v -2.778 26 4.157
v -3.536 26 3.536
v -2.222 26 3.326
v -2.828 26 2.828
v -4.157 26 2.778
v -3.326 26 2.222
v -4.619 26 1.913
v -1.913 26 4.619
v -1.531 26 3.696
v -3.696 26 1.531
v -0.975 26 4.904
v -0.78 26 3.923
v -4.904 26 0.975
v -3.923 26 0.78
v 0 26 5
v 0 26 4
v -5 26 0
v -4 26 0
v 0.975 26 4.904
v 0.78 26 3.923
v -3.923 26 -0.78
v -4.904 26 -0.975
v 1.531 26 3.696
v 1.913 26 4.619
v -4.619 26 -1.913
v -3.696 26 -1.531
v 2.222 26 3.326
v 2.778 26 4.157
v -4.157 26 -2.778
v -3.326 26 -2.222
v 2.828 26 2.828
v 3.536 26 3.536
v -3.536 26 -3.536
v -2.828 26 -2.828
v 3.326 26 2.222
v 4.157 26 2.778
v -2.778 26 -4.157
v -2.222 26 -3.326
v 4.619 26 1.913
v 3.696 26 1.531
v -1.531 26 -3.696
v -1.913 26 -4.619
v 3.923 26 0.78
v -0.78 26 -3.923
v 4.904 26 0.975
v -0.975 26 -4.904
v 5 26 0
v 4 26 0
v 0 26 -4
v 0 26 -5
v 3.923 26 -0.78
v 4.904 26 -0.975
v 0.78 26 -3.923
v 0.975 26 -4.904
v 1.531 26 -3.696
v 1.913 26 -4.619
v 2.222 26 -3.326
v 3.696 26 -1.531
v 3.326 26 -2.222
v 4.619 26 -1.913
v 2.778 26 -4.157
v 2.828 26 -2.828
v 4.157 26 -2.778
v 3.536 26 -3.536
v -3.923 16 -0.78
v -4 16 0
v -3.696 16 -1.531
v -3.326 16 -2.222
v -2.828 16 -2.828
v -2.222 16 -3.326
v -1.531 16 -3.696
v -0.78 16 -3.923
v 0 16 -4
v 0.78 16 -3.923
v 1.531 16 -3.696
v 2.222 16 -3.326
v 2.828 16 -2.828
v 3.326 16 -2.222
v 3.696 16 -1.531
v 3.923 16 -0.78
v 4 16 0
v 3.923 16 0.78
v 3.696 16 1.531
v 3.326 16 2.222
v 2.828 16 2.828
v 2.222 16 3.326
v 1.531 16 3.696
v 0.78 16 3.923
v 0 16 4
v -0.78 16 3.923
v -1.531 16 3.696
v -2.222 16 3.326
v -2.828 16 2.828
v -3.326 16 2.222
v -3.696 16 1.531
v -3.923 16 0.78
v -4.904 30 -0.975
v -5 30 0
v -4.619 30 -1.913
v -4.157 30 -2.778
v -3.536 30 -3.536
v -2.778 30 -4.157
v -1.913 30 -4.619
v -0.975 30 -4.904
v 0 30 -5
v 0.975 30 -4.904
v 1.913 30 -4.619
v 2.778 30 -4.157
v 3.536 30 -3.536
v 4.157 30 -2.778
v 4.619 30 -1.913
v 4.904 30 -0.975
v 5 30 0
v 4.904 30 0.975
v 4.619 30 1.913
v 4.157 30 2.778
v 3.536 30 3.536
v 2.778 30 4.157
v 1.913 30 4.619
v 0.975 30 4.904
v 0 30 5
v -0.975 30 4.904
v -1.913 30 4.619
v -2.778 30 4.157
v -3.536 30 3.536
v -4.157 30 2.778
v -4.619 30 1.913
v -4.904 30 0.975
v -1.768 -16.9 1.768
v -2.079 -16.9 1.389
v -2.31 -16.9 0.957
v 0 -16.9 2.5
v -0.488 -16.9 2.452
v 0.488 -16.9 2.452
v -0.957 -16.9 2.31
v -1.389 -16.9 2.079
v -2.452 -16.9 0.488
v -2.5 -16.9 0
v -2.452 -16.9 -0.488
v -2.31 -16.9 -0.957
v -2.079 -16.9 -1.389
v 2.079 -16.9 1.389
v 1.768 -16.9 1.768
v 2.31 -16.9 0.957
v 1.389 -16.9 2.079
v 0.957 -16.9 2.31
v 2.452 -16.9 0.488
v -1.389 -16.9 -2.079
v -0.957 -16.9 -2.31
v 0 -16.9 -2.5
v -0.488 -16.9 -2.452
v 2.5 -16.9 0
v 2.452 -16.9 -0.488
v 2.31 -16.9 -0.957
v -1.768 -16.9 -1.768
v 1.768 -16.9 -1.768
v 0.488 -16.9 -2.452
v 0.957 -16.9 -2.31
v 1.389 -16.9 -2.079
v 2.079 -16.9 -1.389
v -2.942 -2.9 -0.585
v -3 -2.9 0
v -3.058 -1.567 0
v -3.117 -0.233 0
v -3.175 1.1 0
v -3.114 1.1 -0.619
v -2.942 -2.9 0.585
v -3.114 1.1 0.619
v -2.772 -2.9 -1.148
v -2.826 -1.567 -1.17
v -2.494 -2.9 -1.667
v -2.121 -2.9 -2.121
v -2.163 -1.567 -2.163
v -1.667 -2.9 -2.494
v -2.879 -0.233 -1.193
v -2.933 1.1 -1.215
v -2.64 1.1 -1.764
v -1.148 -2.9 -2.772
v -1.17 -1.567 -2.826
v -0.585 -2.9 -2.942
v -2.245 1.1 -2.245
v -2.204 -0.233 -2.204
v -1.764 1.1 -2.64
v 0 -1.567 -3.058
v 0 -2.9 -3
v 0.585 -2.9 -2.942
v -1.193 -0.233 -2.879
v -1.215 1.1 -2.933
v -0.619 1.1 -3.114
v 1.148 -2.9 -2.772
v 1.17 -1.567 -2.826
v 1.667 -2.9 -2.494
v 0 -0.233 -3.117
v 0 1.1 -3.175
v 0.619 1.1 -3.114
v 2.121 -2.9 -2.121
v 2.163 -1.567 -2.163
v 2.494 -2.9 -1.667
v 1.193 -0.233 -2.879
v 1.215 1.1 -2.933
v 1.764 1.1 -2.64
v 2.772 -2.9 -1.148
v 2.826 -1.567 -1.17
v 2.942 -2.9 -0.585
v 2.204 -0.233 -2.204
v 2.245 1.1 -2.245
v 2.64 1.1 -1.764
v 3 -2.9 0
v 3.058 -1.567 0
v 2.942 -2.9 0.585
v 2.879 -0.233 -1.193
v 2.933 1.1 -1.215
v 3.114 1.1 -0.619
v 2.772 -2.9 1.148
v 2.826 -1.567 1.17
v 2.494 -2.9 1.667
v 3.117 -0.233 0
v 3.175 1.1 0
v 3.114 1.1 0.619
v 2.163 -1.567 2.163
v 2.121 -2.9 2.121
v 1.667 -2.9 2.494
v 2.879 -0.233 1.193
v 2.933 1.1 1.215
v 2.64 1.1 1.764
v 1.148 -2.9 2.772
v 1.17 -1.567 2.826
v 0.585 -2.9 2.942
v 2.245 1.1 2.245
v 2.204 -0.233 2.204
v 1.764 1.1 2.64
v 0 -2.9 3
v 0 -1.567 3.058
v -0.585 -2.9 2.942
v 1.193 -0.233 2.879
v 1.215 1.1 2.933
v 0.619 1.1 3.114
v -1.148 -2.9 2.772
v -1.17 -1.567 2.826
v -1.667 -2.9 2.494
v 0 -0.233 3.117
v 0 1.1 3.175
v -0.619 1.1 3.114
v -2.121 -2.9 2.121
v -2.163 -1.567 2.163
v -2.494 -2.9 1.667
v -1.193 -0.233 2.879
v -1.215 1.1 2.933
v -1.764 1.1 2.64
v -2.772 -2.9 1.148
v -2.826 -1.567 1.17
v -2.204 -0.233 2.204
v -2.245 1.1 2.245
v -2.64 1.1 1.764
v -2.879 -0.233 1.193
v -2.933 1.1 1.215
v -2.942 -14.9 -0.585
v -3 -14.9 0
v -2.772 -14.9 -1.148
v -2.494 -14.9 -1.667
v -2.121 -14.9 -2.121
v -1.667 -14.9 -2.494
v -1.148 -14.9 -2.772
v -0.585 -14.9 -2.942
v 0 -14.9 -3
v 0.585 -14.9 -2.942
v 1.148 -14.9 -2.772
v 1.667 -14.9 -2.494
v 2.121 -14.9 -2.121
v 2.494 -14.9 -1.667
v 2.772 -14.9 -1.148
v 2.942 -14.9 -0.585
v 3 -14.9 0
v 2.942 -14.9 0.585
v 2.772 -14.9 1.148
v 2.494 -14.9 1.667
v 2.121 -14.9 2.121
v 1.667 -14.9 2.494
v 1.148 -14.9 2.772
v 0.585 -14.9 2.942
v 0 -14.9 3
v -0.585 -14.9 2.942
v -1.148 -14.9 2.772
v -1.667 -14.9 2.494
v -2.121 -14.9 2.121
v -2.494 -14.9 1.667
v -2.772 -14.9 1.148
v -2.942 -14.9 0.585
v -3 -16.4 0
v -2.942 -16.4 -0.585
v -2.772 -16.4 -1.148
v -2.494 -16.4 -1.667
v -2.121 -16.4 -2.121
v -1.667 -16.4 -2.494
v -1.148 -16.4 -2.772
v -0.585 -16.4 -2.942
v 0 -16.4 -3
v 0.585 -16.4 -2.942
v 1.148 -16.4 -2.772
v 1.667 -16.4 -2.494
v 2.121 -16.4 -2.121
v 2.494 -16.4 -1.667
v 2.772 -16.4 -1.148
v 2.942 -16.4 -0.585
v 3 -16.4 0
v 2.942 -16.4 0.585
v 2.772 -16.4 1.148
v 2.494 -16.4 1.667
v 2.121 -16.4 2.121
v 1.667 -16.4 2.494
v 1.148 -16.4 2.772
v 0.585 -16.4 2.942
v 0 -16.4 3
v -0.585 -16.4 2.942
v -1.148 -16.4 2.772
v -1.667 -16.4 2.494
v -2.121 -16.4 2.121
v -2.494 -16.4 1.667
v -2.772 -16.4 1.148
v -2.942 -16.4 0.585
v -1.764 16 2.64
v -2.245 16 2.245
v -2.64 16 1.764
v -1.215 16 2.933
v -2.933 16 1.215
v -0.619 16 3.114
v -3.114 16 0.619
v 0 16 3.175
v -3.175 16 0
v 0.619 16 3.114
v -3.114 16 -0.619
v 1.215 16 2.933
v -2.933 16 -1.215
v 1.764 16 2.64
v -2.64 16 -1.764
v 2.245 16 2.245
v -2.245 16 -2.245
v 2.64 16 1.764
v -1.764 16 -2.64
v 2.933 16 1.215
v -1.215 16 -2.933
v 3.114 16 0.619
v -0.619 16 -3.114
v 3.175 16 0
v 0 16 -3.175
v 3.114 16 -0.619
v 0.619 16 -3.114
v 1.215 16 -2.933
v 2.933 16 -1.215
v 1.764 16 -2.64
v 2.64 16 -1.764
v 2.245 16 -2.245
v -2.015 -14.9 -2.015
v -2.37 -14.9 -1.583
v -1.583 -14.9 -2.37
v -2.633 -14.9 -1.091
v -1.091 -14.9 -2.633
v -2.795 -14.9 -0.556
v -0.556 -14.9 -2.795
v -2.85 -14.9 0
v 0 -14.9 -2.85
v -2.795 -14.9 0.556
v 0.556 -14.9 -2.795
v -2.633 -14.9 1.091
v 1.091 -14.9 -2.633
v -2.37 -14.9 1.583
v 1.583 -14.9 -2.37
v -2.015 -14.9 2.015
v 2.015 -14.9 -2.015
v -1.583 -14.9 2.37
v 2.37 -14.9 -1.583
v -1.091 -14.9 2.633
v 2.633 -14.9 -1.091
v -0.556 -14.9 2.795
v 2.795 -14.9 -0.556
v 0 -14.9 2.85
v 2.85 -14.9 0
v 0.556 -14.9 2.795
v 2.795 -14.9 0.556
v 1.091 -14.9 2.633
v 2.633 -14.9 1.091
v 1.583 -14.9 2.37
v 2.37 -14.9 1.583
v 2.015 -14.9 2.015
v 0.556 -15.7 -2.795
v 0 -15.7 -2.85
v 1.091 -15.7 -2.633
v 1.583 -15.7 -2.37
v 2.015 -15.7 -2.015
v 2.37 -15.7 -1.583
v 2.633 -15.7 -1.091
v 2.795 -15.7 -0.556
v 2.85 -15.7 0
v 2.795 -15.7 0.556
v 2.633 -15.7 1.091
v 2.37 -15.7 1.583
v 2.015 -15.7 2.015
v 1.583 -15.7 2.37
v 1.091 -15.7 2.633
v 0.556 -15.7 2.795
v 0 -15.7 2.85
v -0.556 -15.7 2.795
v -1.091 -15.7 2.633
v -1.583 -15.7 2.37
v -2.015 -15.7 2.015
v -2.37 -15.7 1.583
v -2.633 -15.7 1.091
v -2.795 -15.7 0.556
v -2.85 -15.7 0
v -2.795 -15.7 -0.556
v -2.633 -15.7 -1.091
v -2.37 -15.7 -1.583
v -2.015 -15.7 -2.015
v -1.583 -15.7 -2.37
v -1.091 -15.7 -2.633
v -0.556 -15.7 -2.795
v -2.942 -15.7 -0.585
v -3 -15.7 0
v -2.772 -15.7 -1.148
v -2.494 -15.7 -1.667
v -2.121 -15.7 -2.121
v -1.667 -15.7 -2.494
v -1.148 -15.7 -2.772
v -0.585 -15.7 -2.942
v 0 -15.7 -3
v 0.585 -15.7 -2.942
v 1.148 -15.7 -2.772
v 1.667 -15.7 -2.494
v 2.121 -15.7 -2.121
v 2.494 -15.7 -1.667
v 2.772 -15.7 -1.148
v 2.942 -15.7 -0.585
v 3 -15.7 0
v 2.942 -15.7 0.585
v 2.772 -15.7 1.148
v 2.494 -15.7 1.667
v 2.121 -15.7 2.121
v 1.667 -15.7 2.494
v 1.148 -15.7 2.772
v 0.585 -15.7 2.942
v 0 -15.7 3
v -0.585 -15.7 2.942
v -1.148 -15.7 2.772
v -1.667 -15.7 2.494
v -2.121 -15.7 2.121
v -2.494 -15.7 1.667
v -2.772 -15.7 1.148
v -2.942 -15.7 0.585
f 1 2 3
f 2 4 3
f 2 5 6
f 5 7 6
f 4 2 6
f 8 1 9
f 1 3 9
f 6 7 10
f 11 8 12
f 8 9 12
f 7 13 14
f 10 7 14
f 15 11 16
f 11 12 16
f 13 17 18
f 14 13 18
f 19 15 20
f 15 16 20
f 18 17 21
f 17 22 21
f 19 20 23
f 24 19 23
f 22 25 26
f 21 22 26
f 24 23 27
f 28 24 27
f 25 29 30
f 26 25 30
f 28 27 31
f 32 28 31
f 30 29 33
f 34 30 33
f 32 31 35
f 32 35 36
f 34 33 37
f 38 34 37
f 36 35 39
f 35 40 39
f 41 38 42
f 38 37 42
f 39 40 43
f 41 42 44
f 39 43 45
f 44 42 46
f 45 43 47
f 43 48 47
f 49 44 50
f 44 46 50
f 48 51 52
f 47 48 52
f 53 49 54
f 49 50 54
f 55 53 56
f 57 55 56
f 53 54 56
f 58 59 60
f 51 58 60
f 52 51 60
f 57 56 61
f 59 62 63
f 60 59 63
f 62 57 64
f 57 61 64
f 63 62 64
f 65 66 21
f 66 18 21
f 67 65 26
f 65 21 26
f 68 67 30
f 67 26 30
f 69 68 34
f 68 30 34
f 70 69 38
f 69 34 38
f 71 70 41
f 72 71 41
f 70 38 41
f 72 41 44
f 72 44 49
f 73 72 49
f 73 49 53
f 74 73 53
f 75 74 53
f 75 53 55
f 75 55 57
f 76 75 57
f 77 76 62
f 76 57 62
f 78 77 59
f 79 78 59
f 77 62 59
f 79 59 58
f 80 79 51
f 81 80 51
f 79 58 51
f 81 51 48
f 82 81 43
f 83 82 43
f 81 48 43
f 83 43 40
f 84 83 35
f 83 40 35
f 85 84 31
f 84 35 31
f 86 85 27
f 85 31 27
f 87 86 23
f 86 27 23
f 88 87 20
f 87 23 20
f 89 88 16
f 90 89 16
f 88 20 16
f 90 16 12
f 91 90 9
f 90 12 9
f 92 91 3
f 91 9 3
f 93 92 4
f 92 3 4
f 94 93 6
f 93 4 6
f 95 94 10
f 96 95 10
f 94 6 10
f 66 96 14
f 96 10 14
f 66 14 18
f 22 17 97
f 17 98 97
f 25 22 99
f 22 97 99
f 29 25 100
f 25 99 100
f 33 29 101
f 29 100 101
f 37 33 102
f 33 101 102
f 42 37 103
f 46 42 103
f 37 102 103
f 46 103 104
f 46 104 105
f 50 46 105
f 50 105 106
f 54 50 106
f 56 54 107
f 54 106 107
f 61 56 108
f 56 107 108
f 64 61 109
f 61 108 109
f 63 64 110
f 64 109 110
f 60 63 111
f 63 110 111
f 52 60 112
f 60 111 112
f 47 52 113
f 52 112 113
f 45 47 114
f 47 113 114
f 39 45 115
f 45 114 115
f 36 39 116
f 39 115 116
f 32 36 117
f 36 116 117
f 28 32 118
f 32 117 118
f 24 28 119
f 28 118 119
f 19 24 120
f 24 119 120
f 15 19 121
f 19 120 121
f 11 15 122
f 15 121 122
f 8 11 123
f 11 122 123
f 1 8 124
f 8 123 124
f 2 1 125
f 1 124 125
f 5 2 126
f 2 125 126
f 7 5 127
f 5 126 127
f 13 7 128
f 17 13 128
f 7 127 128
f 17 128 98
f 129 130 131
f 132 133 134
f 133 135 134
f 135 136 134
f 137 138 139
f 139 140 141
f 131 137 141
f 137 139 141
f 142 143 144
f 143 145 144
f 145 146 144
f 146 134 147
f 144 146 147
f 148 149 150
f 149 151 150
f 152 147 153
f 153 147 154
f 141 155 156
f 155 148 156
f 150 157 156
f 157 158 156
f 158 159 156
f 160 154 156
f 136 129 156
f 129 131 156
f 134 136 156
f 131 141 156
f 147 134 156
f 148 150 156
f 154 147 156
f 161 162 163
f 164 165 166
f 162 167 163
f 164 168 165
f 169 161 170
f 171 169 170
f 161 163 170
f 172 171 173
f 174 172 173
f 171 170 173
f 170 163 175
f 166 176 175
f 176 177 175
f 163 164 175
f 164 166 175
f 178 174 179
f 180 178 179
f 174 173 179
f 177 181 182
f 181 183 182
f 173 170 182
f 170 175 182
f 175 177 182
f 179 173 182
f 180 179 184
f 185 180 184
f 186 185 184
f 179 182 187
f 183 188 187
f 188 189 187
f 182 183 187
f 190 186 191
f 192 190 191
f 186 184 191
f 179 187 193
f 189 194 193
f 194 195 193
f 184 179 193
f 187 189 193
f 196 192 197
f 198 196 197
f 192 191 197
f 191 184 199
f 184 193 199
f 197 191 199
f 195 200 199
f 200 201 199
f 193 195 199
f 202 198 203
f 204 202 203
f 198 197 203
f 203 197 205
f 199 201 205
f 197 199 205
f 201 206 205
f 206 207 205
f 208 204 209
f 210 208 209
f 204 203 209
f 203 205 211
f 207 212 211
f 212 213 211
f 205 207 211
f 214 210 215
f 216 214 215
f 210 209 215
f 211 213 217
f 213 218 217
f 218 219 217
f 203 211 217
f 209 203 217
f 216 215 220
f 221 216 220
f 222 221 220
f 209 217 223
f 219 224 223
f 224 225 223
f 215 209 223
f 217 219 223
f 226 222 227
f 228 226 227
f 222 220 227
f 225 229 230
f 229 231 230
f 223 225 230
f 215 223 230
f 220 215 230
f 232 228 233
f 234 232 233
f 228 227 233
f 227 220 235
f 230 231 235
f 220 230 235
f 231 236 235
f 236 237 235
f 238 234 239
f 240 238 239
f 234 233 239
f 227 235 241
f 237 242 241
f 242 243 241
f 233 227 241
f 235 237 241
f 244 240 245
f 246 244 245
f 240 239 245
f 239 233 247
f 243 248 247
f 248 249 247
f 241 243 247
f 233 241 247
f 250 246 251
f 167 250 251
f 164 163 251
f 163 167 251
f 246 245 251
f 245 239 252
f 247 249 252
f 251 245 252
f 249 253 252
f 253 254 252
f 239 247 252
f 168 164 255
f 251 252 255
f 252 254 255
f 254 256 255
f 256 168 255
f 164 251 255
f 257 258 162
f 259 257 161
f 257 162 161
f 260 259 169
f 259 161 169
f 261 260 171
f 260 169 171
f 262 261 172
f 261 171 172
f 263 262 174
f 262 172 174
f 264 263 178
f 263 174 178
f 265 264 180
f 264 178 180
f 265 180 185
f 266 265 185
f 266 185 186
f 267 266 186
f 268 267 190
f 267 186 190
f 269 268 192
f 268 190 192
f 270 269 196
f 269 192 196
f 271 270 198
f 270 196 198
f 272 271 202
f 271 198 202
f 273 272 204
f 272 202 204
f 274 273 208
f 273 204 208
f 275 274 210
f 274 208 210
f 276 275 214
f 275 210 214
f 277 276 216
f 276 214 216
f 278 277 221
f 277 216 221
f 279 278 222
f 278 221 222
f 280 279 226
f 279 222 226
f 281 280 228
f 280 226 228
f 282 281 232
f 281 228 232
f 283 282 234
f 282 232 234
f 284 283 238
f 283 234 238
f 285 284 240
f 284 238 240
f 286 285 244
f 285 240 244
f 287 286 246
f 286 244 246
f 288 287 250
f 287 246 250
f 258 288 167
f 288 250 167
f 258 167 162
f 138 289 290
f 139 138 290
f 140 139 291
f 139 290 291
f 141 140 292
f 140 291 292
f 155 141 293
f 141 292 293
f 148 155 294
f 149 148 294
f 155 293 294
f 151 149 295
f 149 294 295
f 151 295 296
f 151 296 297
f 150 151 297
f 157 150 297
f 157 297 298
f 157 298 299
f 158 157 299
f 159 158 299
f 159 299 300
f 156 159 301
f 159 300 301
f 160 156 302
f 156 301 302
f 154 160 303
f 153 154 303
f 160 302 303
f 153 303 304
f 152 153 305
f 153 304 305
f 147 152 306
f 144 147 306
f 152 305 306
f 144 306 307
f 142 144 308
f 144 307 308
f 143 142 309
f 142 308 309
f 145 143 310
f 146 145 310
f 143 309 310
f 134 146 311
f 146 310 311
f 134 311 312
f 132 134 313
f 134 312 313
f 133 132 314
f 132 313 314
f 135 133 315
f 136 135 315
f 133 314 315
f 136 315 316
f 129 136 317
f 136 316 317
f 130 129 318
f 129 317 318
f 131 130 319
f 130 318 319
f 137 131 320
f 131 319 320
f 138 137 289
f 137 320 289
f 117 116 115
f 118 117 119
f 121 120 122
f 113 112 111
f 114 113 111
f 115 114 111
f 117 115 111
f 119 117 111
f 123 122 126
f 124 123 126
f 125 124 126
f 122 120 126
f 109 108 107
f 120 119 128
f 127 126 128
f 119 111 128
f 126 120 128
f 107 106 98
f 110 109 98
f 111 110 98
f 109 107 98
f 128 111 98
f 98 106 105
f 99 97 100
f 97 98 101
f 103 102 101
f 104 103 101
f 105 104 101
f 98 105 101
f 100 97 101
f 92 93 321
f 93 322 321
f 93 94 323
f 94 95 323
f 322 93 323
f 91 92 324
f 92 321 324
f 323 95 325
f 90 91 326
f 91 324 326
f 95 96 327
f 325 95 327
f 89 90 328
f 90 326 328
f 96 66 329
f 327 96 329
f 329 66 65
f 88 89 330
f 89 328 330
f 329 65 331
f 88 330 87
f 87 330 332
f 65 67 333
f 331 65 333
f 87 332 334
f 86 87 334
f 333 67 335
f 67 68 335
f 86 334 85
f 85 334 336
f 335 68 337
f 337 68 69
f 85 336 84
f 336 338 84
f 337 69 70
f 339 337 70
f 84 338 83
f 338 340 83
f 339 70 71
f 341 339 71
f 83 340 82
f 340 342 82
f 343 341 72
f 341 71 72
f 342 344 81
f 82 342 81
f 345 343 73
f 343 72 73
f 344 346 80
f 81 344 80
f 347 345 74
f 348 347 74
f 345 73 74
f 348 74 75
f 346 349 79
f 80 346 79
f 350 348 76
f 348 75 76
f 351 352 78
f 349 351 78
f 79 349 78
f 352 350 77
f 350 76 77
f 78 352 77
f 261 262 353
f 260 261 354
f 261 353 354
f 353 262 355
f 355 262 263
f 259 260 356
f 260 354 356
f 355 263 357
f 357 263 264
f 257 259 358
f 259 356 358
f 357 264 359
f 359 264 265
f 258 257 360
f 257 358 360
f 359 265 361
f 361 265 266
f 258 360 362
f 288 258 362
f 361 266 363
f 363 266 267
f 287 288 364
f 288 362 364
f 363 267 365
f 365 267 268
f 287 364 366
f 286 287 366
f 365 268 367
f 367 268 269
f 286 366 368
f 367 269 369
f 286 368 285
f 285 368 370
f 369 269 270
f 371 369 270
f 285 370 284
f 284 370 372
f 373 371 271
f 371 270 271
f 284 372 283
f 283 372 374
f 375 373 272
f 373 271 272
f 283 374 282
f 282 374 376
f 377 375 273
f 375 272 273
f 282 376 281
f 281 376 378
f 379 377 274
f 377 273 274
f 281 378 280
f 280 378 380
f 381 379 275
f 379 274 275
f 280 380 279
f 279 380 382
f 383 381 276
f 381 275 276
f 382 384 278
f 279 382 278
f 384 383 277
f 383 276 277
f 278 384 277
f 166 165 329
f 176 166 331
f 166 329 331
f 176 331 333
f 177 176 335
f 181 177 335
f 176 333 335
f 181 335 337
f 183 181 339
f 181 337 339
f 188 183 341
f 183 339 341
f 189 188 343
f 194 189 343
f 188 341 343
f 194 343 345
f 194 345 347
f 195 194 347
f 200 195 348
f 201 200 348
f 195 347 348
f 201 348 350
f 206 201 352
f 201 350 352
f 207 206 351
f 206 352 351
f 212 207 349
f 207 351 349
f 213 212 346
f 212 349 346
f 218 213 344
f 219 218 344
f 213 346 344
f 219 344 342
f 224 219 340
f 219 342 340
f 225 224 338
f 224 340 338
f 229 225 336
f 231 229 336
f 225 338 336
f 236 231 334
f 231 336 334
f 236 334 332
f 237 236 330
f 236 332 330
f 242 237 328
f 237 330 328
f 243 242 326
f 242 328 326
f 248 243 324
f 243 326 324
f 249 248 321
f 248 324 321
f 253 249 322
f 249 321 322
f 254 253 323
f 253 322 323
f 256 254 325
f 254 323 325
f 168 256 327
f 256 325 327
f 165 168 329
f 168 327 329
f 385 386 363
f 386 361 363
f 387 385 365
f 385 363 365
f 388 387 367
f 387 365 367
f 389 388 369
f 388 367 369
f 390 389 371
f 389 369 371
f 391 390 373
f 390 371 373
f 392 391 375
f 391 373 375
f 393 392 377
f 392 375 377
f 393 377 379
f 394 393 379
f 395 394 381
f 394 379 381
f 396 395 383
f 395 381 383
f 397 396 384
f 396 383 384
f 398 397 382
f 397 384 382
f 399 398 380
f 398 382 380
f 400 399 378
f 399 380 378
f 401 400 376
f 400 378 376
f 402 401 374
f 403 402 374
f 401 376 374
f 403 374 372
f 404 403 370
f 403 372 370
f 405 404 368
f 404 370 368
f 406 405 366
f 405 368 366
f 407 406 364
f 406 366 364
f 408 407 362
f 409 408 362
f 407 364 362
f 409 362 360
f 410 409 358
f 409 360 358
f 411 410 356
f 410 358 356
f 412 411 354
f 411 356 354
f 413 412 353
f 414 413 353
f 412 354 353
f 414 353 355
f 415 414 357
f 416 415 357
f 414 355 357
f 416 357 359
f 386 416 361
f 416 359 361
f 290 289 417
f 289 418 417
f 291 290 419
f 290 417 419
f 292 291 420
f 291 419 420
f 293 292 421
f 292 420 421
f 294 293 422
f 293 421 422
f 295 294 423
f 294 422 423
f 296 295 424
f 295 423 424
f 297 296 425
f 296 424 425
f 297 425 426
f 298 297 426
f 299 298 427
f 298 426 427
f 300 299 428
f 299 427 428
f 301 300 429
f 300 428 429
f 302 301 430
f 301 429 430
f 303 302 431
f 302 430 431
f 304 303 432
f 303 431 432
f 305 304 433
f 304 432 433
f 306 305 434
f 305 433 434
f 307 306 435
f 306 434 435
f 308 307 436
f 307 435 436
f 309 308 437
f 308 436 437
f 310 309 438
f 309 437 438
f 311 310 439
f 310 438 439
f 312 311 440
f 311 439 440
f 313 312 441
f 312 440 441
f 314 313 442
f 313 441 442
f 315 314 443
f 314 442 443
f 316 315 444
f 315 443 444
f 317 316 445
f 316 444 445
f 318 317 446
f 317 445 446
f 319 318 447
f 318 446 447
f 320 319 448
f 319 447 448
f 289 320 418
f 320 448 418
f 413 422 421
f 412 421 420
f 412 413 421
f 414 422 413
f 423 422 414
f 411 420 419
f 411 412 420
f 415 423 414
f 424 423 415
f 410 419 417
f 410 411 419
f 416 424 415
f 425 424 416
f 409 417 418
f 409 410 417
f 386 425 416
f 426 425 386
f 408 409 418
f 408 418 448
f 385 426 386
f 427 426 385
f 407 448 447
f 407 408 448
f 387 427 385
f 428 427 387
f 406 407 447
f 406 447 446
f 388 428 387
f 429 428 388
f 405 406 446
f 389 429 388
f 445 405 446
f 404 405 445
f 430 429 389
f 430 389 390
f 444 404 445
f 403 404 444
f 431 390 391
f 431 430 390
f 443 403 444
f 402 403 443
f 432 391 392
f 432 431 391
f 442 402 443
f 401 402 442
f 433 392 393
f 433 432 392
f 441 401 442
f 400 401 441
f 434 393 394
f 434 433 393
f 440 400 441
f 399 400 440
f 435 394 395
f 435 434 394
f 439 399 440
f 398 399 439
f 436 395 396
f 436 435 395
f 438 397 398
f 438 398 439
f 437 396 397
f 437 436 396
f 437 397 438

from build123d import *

# Parameters (mm, degrees)
CHAMFER5_SIZE = 0.5
SKETCH3_W     = 0.15
SKETCH3_H     = 0.8


with BuildPart() as part:
    # Sketch1 → Revolve1 (revolve)
    with BuildSketch(Plane.XY):
        Polygon((0, -16.9), (-3.175, -16.9), (-3.175, 16), (-4, 16), (-4, 26), (-5, 26), (-5, 30), (0, 30), (0, 18.825290935), align=None)
    revolve(axis=Axis((0, 55, 0), (0, -1, 0)))

    # Sketch2 → Cut-Revolve1 (revolve, cut)
    with BuildSketch(Plane.XY):
        Polygon((-3, -2.9), (-3.175, 1.1), (-3.175, -3.698889695), (-3.175, -16.9), (-3, -16.9), align=None)
    revolve(axis=Axis((0, 55, 0), (0, -1, 0)), mode=Mode.SUBTRACT)

    # Chamfer5
    chamfer5_edges = [part.edges().sort_by_distance(p)[0] for p in [
        (3, -16.9, 0),
    ]]
    chamfer(chamfer5_edges, length=CHAMFER5_SIZE)

    # Sketch3 → Cut-Revolve2 (revolve, cut)
    with BuildSketch(Plane(origin=(0, 0, 0), x_dir=(0, 0, -1), z_dir=(1, 0, 0))):
        with Locations((2.925, -15.3)):
            Rectangle(SKETCH3_W, SKETCH3_H)
    revolve(axis=Axis((0, 55, 0), (0, -1, 0)), mode=Mode.SUBTRACT)


solid = part.part
